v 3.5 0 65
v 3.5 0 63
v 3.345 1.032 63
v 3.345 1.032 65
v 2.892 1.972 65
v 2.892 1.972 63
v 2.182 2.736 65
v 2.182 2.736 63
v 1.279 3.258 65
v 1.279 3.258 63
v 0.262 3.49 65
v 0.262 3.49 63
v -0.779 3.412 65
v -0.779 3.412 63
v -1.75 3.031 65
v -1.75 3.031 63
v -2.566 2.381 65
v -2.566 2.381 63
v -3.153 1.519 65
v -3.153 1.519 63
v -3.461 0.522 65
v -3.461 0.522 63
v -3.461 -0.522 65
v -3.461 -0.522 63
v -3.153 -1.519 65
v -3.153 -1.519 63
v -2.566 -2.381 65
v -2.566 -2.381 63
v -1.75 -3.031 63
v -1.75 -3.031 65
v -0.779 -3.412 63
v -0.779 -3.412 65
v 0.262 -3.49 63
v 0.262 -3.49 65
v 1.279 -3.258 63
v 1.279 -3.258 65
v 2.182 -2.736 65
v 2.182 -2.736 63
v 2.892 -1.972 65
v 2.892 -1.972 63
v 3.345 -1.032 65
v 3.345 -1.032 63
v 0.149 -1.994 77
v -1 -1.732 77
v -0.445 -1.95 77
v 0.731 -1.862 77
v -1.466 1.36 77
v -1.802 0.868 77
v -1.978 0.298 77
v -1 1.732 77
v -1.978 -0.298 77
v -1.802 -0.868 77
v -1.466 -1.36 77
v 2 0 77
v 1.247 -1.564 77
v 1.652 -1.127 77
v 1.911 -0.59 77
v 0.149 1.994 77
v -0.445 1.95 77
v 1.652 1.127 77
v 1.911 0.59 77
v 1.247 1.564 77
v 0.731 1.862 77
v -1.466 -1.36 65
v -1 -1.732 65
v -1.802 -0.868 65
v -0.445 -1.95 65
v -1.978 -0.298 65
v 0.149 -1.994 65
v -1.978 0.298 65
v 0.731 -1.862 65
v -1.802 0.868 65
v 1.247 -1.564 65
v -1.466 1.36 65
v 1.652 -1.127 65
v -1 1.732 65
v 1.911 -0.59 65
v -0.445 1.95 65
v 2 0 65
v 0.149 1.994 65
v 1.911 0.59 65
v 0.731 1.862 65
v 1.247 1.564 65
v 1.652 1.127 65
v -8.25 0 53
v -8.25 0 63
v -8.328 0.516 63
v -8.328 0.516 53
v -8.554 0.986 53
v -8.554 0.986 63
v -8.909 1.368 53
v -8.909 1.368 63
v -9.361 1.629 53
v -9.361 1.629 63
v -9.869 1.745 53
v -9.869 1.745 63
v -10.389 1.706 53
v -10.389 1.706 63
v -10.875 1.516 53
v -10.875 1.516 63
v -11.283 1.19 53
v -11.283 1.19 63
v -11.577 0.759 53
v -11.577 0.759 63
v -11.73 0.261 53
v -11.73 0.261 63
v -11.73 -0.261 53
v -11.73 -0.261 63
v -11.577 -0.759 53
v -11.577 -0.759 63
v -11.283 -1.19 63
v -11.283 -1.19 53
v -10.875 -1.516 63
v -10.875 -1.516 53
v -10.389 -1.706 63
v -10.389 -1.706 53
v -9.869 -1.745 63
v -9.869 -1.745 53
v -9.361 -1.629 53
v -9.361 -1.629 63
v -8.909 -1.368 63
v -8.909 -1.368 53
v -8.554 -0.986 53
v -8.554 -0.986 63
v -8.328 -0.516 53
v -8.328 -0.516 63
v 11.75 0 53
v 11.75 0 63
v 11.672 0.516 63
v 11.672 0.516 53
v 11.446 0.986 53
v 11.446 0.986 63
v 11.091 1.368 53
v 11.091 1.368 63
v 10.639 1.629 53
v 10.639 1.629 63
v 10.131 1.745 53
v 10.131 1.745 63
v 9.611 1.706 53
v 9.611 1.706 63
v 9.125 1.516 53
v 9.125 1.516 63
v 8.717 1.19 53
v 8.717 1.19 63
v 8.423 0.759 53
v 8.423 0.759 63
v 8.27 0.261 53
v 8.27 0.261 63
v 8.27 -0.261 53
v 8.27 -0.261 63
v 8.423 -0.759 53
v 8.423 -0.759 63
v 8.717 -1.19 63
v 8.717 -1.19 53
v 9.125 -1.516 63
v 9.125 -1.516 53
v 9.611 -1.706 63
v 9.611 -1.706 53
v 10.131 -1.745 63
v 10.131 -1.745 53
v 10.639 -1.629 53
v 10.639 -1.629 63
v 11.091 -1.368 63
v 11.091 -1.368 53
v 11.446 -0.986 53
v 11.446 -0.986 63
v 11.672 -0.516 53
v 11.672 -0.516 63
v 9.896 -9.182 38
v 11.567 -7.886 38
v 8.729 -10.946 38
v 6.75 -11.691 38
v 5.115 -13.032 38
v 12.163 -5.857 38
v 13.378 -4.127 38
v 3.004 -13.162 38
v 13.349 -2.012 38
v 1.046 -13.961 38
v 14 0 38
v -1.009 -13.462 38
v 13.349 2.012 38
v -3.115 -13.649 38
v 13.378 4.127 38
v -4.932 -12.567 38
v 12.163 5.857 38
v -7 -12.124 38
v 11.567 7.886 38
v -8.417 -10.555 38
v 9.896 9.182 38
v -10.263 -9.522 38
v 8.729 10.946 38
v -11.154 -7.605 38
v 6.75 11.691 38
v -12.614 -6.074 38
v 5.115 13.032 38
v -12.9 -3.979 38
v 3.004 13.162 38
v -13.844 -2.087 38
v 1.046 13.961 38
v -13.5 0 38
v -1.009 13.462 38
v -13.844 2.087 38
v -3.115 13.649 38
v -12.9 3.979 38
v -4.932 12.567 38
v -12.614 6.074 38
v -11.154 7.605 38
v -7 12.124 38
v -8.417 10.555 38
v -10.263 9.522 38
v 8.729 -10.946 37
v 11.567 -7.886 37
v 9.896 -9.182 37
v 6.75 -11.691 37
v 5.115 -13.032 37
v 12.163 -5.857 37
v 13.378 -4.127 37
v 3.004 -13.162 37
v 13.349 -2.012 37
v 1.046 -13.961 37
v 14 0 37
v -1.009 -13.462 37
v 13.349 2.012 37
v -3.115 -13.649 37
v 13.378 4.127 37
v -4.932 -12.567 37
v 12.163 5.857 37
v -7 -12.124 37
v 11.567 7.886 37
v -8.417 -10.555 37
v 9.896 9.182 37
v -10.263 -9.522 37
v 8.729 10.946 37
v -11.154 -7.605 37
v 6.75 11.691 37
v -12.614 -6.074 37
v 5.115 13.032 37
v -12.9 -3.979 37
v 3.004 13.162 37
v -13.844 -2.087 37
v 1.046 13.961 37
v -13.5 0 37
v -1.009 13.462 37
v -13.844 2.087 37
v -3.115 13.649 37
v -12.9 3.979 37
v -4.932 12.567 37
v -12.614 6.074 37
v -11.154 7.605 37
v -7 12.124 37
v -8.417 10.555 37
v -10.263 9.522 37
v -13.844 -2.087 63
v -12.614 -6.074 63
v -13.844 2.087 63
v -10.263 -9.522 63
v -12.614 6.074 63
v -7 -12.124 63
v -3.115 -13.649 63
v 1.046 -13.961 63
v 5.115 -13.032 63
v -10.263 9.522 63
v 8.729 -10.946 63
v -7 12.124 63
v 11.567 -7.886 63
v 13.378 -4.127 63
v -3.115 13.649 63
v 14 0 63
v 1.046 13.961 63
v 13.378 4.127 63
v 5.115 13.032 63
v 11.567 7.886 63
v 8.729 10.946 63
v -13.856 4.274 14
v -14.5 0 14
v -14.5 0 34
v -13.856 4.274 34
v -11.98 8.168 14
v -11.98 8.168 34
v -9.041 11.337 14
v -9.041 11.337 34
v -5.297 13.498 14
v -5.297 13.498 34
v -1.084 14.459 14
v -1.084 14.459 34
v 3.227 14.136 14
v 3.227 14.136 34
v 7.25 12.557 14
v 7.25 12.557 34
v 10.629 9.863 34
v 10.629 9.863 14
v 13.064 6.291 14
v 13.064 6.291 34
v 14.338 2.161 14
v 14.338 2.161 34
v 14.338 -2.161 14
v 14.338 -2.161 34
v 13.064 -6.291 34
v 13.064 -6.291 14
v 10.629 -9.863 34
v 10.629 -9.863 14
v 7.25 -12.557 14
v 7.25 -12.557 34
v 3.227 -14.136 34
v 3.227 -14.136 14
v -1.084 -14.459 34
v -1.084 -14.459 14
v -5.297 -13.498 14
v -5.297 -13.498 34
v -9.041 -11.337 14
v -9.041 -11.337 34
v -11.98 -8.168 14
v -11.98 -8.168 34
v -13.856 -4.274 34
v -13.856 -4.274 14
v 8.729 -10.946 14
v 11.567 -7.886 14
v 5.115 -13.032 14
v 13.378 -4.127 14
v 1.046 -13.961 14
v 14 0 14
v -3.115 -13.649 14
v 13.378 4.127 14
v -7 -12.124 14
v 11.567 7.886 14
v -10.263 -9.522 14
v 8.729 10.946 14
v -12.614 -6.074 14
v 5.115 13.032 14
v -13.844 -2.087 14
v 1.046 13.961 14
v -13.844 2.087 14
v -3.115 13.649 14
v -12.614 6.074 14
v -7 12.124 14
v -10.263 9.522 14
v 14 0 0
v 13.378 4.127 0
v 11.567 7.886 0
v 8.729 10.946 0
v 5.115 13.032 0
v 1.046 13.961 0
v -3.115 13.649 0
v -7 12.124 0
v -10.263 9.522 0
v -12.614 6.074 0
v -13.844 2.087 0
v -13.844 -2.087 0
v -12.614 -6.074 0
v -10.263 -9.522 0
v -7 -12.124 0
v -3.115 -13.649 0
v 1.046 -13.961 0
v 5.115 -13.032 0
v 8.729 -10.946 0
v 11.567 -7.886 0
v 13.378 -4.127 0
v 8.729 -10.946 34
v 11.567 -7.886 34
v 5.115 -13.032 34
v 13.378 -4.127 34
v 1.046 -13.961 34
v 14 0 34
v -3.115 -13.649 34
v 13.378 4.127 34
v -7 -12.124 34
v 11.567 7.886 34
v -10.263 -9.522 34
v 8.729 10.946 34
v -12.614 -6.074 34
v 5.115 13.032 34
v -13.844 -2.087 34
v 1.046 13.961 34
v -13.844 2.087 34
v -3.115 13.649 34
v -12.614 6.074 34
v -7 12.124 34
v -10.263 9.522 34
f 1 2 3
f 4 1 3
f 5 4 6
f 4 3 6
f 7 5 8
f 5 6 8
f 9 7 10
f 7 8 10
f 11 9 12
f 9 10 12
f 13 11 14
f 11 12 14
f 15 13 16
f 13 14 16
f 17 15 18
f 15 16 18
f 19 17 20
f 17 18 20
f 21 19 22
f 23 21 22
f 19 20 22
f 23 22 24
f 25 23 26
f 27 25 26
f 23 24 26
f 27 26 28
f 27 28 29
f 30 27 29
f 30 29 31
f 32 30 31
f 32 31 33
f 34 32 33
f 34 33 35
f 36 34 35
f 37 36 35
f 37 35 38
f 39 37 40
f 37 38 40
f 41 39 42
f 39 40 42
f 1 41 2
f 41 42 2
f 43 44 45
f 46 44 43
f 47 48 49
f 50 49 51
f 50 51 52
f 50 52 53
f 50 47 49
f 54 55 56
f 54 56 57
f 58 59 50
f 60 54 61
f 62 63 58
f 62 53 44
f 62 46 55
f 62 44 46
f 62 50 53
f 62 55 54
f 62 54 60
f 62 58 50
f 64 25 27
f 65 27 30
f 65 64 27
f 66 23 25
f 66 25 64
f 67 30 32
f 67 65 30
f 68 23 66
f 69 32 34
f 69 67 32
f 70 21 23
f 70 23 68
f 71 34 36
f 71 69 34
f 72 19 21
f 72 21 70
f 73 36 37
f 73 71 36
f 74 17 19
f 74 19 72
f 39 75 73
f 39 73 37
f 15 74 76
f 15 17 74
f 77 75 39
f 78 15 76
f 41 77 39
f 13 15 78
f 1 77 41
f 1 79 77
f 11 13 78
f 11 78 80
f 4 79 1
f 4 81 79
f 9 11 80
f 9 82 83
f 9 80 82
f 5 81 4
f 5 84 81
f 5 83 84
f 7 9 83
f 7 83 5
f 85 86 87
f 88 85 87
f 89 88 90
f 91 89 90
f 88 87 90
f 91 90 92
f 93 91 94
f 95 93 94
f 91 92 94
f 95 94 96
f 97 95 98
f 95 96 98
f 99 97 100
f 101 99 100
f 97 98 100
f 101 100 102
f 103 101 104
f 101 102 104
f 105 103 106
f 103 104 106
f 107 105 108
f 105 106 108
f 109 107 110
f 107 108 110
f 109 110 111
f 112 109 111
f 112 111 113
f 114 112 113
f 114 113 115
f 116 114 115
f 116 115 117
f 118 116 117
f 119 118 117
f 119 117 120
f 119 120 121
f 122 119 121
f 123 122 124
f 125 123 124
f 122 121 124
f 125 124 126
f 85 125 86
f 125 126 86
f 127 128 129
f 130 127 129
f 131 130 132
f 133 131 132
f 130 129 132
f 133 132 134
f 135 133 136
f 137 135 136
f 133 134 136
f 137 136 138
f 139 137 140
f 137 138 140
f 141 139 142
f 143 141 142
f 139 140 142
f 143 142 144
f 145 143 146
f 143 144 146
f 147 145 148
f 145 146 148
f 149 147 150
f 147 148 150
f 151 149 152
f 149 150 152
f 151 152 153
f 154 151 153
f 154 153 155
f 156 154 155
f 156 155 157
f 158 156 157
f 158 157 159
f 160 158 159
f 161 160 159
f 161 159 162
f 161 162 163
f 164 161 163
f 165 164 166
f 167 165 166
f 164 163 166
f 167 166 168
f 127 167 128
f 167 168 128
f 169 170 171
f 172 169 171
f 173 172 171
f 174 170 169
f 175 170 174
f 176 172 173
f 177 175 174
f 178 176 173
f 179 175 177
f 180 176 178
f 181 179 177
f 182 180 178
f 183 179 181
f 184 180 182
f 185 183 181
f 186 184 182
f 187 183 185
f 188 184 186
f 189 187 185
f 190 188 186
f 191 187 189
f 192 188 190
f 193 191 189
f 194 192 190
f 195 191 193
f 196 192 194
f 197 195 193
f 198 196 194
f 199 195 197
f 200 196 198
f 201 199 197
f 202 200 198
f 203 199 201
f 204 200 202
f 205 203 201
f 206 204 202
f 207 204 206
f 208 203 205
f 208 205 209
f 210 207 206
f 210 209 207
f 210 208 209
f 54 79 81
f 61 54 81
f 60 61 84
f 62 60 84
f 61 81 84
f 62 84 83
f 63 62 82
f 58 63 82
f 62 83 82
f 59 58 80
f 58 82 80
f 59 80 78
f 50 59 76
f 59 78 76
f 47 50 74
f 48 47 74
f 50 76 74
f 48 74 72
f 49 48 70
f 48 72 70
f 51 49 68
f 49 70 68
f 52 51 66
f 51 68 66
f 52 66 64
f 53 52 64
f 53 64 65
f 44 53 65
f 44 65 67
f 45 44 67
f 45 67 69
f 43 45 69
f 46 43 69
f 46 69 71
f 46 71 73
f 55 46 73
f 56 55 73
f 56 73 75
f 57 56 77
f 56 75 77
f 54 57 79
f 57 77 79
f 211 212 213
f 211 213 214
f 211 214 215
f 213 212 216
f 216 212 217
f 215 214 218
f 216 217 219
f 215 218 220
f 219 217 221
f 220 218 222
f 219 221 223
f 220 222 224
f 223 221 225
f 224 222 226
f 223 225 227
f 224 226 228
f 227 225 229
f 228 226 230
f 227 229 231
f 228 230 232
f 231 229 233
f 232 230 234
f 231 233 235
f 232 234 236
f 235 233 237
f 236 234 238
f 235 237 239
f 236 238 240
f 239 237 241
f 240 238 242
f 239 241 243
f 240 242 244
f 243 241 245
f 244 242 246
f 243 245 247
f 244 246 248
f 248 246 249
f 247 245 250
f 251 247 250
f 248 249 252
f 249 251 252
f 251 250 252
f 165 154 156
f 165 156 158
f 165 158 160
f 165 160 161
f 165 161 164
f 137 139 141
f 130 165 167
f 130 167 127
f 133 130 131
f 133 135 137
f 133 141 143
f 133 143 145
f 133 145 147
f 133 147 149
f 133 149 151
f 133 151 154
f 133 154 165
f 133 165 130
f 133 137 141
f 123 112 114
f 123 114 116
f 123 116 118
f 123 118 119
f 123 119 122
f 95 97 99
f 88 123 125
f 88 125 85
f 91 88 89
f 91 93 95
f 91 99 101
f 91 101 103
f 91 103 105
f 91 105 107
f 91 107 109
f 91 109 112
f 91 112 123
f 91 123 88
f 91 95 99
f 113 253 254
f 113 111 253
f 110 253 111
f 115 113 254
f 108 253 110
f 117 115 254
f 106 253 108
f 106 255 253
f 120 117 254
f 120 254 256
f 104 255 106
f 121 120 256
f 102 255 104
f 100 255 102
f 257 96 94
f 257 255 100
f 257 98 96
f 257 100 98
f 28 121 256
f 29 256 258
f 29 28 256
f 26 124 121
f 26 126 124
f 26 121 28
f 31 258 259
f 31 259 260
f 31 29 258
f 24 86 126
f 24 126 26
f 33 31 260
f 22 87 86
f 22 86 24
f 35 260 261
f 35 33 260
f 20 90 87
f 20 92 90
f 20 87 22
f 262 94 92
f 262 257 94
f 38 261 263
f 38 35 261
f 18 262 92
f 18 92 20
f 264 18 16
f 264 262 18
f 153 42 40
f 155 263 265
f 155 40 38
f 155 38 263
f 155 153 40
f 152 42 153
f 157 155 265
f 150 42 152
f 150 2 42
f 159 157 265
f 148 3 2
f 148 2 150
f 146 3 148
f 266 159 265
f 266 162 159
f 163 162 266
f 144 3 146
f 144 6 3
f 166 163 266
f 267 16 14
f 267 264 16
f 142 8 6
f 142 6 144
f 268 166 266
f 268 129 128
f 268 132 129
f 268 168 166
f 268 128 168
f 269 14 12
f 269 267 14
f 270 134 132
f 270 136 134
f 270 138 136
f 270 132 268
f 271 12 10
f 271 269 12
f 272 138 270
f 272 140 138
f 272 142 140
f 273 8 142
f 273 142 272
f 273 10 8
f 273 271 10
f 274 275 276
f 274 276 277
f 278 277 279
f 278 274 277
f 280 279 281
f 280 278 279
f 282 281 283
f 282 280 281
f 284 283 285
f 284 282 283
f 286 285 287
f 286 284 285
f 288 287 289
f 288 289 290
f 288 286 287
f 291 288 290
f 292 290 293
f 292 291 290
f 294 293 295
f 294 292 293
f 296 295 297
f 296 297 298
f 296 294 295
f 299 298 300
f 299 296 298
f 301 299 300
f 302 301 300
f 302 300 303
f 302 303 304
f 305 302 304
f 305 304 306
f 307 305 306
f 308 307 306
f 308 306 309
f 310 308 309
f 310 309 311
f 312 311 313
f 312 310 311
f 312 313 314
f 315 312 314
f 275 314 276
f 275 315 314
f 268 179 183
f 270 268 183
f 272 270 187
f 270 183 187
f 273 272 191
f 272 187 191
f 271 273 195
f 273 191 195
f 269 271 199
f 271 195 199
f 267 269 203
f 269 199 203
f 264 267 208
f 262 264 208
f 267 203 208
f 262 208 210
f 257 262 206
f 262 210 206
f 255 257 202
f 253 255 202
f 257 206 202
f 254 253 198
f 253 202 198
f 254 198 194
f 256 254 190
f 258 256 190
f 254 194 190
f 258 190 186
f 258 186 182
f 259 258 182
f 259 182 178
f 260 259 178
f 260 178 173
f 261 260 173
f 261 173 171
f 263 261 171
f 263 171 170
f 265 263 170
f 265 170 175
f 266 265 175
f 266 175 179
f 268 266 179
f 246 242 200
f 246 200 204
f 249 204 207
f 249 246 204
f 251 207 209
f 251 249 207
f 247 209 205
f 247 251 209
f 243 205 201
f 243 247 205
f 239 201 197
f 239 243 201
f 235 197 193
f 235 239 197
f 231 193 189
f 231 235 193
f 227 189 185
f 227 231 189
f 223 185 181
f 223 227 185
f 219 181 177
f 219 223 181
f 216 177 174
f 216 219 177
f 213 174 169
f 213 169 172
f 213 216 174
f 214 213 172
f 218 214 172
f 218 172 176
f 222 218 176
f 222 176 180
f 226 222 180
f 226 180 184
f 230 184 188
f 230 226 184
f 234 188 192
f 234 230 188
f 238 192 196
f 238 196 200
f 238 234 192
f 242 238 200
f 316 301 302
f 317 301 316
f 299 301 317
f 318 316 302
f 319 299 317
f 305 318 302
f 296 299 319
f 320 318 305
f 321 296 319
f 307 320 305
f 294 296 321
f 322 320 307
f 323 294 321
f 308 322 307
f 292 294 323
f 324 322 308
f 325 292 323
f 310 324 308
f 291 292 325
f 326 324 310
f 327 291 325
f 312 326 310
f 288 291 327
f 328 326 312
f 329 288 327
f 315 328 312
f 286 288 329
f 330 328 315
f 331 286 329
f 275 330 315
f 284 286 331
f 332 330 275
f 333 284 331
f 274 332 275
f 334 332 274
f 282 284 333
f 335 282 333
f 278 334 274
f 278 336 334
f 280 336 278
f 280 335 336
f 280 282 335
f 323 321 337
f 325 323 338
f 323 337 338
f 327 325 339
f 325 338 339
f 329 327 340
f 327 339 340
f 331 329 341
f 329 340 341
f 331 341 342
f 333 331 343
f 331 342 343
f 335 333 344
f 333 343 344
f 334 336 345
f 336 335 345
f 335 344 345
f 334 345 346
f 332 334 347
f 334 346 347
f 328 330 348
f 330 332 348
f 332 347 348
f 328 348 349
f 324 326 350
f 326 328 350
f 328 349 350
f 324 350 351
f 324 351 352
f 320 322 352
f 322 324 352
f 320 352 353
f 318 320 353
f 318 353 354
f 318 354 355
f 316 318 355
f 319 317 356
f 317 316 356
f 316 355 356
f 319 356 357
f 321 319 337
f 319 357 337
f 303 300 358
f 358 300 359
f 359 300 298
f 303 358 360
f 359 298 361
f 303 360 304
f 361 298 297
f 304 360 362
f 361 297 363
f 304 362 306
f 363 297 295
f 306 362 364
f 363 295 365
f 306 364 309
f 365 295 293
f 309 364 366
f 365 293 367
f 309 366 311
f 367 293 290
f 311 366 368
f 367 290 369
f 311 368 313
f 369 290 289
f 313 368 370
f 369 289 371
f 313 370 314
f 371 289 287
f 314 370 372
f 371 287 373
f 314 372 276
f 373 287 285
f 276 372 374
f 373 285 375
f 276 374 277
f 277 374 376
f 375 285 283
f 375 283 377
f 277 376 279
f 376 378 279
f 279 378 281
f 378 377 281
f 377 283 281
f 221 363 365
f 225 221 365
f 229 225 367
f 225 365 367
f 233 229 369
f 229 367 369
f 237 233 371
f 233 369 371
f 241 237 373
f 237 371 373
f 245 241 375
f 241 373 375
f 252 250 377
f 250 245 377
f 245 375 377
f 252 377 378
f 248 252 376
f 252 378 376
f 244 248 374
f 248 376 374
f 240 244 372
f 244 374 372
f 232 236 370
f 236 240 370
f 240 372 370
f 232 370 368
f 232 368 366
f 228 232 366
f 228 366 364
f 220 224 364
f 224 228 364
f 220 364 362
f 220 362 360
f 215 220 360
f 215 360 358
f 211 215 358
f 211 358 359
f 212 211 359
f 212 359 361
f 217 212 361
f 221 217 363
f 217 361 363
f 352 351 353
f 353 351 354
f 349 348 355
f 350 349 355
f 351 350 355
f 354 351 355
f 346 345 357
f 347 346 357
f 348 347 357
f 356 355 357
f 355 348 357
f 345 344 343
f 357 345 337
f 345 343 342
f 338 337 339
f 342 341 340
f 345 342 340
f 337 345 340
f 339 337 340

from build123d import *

# Parameters (mm, degrees)
SKETCH1_R           = 14
BOSS_EXTRUDE1_DEPTH = 63
SKETCH2_R           = 3.5
BOSS_EXTRUDE2_DEPTH = 2
SKETCH3_R           = 2
BOSS_EXTRUDE3_DEPTH = 12
SKETCH4_R           = 14.5
BOSS_EXTRUDE4_DEPTH = 20
SKETCH5_OUTSIDE_W   = 48.448
SKETCH5_OUTSIDE_H   = 48.448
SKETCH5_OUTSIDE_R   = 13.5
CUT_EXTRUDE1_DEPTH  = 1
SKETCH6_R           = 1.75
CUT_EXTRUDE2_DEPTH  = 10


with BuildPart() as part:
    # Sketch1 → Boss-Extrude1 (new body)
    with BuildSketch(Plane.XY):
        Circle(SKETCH1_R)
    extrude(amount=BOSS_EXTRUDE1_DEPTH)

    # Sketch2 → Boss-Extrude2 (add)
    with BuildSketch(Plane.XY.offset(63)):
        Circle(SKETCH2_R)
    extrude(amount=BOSS_EXTRUDE2_DEPTH)

    # Sketch3 → Boss-Extrude3 (add)
    with BuildSketch(Plane.XY.offset(65)):
        Circle(SKETCH3_R)
    extrude(amount=BOSS_EXTRUDE3_DEPTH)

    # Sketch4 → Boss-Extrude4 (add)
    with BuildSketch(Plane(origin=(0, 0, 14), x_dir=(-1, 0, 0), z_dir=(0, 0, -1))):
        Circle(SKETCH4_R)
    extrude(amount=-BOSS_EXTRUDE4_DEPTH)

    # Sketch5 outside → Cut-Extrude1 (cut)
    with BuildSketch(Plane(origin=(0, 0, 37), x_dir=(-1, 0, 0), z_dir=(0, 0, -1))):
        Rectangle(SKETCH5_OUTSIDE_W, SKETCH5_OUTSIDE_H)
        Circle(SKETCH5_OUTSIDE_R, mode=Mode.SUBTRACT)
    extrude(amount=-CUT_EXTRUDE1_DEPTH, mode=Mode.SUBTRACT)

    # Sketch6 → Cut-Extrude2 (cut)
    with BuildSketch(Plane.XY.offset(63)):
        with Locations((-10, 0)):
            Circle(SKETCH6_R)
        with Locations((10, 0)):
            Circle(SKETCH6_R)
    extrude(amount=-CUT_EXTRUDE2_DEPTH, mode=Mode.SUBTRACT)


solid = part.part
